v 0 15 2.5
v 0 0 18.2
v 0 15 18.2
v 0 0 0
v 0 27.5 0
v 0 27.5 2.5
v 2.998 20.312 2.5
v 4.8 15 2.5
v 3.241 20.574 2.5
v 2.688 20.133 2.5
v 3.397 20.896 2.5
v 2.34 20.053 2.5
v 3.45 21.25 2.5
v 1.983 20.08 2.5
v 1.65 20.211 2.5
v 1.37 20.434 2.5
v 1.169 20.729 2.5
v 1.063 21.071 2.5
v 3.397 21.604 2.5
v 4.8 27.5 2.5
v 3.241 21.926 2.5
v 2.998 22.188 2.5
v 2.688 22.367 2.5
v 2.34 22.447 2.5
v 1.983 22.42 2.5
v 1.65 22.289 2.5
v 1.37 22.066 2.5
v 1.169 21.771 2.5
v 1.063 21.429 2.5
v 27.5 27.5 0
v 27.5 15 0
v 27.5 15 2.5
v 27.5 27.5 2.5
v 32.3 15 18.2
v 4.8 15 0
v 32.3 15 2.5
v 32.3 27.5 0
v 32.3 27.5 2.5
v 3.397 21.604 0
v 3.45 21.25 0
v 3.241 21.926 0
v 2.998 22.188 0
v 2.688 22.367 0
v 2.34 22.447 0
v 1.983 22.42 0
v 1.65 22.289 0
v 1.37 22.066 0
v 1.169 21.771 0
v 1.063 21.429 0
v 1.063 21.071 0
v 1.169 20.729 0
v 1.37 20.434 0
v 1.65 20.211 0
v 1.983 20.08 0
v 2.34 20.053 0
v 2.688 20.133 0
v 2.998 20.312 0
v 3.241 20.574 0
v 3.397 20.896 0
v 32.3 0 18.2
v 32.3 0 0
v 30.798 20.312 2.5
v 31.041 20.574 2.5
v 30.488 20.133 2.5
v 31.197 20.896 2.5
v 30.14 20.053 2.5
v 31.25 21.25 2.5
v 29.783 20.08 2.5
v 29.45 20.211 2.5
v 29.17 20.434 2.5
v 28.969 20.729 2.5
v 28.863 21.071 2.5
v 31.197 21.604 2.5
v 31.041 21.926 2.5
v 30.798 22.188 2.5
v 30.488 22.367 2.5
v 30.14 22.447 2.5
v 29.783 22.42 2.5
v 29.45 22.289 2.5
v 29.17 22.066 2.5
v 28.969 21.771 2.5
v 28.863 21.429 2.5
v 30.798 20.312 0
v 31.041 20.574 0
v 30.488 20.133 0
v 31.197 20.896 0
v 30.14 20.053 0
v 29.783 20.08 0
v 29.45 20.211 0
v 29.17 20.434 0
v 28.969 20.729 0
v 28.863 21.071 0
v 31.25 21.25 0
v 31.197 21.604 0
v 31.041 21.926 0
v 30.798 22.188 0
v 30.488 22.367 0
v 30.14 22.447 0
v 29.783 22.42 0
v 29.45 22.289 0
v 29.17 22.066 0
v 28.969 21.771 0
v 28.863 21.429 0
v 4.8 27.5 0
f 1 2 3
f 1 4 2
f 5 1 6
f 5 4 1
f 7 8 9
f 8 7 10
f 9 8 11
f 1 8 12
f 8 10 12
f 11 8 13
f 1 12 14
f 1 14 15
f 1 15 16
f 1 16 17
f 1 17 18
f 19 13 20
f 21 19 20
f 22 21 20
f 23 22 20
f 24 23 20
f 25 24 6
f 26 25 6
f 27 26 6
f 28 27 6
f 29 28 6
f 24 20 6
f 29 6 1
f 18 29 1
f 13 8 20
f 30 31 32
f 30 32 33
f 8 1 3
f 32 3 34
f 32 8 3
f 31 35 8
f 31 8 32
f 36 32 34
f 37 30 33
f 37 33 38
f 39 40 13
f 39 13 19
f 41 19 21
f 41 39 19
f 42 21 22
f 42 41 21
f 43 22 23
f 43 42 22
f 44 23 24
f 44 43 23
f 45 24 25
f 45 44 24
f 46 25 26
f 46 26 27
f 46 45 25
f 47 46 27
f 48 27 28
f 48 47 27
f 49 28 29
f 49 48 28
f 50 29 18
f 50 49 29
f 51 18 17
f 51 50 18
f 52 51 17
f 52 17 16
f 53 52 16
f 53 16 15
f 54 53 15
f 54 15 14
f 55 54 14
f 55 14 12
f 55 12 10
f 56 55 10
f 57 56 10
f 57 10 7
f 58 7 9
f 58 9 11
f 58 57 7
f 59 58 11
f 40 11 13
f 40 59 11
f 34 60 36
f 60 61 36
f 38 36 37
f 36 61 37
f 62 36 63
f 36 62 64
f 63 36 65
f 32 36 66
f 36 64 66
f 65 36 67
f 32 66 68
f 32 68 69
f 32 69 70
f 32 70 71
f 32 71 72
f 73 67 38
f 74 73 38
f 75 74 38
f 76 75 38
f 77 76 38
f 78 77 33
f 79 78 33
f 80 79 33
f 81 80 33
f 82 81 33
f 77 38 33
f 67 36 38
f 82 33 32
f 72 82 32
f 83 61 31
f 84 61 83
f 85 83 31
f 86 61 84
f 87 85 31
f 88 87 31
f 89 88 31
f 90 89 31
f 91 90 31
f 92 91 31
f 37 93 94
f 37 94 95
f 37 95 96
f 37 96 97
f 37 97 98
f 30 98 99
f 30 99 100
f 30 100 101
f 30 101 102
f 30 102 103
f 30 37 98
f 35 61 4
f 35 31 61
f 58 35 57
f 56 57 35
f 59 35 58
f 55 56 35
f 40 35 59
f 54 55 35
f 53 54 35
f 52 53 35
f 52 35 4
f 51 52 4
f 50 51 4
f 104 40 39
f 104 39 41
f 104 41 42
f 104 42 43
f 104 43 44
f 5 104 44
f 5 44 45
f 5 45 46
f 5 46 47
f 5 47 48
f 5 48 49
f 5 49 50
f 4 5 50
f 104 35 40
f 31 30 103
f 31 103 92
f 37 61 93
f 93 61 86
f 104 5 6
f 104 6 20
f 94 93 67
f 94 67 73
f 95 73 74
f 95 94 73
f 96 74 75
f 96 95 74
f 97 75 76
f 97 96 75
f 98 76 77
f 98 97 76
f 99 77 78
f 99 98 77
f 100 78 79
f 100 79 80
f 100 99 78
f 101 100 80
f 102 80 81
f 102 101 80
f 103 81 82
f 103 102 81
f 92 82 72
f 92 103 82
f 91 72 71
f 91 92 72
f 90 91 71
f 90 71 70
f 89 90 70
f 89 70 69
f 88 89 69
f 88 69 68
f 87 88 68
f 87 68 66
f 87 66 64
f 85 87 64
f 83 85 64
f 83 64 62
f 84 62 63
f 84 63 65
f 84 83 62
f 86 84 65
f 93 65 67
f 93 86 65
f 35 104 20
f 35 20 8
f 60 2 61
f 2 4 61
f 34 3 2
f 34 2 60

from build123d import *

# Parameters (mm, degrees)
SKETCH1_R           = 1.2
BOSS_EXTRUDE1_DEPTH = 2.5
SKETCH2_W           = 32.3
SKETCH2_H           = 15
BOSS_EXTRUDE2_DEPTH = 15.7


with BuildPart() as part:
    # Sketch1 → Boss-Extrude1 (new body)
    with BuildSketch(Plane.XY):
        Polygon((0, 0), (0, 27.5), (4.8, 27.5), (4.8, 15), (27.5, 15), (27.5, 27.5), (32.3, 27.5), (32.3, 0), align=None)
        with Locations((2.25, 21.25)):
            Circle(SKETCH1_R, mode=Mode.SUBTRACT)
        with Locations((30.05, 21.25)):
            Circle(SKETCH1_R, mode=Mode.SUBTRACT)
    extrude(amount=BOSS_EXTRUDE1_DEPTH)

    # Sketch2 → Boss-Extrude2 (add)
    with BuildSketch(Plane.XY.offset(2.5)):
        with Locations((16.15, 7.5)):
            Rectangle(SKETCH2_W, SKETCH2_H)
    extrude(amount=BOSS_EXTRUDE2_DEPTH)


solid = part.part
